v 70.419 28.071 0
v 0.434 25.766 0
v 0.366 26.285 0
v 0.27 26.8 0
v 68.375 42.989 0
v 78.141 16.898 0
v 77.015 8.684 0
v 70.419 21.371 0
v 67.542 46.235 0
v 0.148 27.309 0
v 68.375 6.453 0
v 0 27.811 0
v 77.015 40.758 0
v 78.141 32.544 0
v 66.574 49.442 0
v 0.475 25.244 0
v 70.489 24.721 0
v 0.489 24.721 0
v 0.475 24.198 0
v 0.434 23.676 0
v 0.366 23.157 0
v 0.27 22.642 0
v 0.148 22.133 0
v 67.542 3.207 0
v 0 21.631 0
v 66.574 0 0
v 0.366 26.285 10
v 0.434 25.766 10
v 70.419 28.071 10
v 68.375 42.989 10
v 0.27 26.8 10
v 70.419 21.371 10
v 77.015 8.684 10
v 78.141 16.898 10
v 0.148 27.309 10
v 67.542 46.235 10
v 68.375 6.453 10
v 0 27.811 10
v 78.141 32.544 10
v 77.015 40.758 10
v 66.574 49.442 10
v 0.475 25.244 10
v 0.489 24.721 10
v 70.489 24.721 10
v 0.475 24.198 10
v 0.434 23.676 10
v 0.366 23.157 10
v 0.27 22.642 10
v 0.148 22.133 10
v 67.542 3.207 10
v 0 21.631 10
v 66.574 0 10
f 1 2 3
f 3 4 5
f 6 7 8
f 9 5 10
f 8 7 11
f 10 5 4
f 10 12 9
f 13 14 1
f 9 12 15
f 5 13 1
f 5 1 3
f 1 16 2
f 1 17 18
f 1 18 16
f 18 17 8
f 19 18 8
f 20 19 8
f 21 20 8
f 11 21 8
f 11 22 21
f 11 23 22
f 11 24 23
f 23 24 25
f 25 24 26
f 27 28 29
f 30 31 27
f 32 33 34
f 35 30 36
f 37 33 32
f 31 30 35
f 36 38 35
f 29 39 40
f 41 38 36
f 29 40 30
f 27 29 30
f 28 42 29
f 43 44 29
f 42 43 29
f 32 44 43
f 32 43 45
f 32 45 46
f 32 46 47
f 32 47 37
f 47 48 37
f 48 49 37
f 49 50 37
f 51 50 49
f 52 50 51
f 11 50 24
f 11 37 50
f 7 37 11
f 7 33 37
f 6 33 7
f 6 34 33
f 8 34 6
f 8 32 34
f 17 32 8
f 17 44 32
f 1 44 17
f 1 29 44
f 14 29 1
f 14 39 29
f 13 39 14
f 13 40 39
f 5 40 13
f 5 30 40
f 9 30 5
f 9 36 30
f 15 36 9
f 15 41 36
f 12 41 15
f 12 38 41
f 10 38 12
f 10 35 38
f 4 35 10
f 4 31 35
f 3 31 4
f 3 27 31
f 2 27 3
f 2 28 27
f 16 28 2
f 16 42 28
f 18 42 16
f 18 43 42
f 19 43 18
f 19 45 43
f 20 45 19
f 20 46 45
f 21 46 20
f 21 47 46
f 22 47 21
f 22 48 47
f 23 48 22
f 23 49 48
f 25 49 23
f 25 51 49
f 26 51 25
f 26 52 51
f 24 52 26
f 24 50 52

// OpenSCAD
$fn = 32;

// ----------------------------------------------------------------------
// Gear sector: 2 teeth on 36 degrees
// ----------------------------------------------------------------------

// --- parameters (mm) ---
sector_angle = 36;        // sector angle, degrees
root_r = 80;              // root circle radius
tooth_h = 8;              // tooth height over the root circle
teeth = 2;                // number of teeth on the sector
hub_r = 10;               // hub bore radius
plate_t = 10;             // sector thickness, Z
arc_step = 3;             // sampling step of the root/hub arcs, degrees

tip_r = root_r + tooth_h;  // tip circle radius

profile = [[66.574, 0], [67.542, 3.207], [68.375, 6.453], [77.015, 8.684], [78.141, 16.898], [70.419, 21.371], [70.489, 24.721], [70.419, 28.071], [78.141, 32.544], [77.015, 40.758], [68.375, 42.989], [67.542, 46.235], [66.574, 49.442], [0, 27.811], [0.148, 27.309], [0.27, 26.8], [0.366, 26.285], [0.434, 25.766], [0.475, 25.244], [0.489, 24.721], [0.475, 24.198], [0.434, 23.676], [0.366, 23.157], [0.27, 22.642], [0.148, 22.133], [0, 21.631]];  // primary outline, 26 points, counter clockwise

// --- the one profile operation ---
linear_extrude(height = plate_t) polygon(points = profile);
